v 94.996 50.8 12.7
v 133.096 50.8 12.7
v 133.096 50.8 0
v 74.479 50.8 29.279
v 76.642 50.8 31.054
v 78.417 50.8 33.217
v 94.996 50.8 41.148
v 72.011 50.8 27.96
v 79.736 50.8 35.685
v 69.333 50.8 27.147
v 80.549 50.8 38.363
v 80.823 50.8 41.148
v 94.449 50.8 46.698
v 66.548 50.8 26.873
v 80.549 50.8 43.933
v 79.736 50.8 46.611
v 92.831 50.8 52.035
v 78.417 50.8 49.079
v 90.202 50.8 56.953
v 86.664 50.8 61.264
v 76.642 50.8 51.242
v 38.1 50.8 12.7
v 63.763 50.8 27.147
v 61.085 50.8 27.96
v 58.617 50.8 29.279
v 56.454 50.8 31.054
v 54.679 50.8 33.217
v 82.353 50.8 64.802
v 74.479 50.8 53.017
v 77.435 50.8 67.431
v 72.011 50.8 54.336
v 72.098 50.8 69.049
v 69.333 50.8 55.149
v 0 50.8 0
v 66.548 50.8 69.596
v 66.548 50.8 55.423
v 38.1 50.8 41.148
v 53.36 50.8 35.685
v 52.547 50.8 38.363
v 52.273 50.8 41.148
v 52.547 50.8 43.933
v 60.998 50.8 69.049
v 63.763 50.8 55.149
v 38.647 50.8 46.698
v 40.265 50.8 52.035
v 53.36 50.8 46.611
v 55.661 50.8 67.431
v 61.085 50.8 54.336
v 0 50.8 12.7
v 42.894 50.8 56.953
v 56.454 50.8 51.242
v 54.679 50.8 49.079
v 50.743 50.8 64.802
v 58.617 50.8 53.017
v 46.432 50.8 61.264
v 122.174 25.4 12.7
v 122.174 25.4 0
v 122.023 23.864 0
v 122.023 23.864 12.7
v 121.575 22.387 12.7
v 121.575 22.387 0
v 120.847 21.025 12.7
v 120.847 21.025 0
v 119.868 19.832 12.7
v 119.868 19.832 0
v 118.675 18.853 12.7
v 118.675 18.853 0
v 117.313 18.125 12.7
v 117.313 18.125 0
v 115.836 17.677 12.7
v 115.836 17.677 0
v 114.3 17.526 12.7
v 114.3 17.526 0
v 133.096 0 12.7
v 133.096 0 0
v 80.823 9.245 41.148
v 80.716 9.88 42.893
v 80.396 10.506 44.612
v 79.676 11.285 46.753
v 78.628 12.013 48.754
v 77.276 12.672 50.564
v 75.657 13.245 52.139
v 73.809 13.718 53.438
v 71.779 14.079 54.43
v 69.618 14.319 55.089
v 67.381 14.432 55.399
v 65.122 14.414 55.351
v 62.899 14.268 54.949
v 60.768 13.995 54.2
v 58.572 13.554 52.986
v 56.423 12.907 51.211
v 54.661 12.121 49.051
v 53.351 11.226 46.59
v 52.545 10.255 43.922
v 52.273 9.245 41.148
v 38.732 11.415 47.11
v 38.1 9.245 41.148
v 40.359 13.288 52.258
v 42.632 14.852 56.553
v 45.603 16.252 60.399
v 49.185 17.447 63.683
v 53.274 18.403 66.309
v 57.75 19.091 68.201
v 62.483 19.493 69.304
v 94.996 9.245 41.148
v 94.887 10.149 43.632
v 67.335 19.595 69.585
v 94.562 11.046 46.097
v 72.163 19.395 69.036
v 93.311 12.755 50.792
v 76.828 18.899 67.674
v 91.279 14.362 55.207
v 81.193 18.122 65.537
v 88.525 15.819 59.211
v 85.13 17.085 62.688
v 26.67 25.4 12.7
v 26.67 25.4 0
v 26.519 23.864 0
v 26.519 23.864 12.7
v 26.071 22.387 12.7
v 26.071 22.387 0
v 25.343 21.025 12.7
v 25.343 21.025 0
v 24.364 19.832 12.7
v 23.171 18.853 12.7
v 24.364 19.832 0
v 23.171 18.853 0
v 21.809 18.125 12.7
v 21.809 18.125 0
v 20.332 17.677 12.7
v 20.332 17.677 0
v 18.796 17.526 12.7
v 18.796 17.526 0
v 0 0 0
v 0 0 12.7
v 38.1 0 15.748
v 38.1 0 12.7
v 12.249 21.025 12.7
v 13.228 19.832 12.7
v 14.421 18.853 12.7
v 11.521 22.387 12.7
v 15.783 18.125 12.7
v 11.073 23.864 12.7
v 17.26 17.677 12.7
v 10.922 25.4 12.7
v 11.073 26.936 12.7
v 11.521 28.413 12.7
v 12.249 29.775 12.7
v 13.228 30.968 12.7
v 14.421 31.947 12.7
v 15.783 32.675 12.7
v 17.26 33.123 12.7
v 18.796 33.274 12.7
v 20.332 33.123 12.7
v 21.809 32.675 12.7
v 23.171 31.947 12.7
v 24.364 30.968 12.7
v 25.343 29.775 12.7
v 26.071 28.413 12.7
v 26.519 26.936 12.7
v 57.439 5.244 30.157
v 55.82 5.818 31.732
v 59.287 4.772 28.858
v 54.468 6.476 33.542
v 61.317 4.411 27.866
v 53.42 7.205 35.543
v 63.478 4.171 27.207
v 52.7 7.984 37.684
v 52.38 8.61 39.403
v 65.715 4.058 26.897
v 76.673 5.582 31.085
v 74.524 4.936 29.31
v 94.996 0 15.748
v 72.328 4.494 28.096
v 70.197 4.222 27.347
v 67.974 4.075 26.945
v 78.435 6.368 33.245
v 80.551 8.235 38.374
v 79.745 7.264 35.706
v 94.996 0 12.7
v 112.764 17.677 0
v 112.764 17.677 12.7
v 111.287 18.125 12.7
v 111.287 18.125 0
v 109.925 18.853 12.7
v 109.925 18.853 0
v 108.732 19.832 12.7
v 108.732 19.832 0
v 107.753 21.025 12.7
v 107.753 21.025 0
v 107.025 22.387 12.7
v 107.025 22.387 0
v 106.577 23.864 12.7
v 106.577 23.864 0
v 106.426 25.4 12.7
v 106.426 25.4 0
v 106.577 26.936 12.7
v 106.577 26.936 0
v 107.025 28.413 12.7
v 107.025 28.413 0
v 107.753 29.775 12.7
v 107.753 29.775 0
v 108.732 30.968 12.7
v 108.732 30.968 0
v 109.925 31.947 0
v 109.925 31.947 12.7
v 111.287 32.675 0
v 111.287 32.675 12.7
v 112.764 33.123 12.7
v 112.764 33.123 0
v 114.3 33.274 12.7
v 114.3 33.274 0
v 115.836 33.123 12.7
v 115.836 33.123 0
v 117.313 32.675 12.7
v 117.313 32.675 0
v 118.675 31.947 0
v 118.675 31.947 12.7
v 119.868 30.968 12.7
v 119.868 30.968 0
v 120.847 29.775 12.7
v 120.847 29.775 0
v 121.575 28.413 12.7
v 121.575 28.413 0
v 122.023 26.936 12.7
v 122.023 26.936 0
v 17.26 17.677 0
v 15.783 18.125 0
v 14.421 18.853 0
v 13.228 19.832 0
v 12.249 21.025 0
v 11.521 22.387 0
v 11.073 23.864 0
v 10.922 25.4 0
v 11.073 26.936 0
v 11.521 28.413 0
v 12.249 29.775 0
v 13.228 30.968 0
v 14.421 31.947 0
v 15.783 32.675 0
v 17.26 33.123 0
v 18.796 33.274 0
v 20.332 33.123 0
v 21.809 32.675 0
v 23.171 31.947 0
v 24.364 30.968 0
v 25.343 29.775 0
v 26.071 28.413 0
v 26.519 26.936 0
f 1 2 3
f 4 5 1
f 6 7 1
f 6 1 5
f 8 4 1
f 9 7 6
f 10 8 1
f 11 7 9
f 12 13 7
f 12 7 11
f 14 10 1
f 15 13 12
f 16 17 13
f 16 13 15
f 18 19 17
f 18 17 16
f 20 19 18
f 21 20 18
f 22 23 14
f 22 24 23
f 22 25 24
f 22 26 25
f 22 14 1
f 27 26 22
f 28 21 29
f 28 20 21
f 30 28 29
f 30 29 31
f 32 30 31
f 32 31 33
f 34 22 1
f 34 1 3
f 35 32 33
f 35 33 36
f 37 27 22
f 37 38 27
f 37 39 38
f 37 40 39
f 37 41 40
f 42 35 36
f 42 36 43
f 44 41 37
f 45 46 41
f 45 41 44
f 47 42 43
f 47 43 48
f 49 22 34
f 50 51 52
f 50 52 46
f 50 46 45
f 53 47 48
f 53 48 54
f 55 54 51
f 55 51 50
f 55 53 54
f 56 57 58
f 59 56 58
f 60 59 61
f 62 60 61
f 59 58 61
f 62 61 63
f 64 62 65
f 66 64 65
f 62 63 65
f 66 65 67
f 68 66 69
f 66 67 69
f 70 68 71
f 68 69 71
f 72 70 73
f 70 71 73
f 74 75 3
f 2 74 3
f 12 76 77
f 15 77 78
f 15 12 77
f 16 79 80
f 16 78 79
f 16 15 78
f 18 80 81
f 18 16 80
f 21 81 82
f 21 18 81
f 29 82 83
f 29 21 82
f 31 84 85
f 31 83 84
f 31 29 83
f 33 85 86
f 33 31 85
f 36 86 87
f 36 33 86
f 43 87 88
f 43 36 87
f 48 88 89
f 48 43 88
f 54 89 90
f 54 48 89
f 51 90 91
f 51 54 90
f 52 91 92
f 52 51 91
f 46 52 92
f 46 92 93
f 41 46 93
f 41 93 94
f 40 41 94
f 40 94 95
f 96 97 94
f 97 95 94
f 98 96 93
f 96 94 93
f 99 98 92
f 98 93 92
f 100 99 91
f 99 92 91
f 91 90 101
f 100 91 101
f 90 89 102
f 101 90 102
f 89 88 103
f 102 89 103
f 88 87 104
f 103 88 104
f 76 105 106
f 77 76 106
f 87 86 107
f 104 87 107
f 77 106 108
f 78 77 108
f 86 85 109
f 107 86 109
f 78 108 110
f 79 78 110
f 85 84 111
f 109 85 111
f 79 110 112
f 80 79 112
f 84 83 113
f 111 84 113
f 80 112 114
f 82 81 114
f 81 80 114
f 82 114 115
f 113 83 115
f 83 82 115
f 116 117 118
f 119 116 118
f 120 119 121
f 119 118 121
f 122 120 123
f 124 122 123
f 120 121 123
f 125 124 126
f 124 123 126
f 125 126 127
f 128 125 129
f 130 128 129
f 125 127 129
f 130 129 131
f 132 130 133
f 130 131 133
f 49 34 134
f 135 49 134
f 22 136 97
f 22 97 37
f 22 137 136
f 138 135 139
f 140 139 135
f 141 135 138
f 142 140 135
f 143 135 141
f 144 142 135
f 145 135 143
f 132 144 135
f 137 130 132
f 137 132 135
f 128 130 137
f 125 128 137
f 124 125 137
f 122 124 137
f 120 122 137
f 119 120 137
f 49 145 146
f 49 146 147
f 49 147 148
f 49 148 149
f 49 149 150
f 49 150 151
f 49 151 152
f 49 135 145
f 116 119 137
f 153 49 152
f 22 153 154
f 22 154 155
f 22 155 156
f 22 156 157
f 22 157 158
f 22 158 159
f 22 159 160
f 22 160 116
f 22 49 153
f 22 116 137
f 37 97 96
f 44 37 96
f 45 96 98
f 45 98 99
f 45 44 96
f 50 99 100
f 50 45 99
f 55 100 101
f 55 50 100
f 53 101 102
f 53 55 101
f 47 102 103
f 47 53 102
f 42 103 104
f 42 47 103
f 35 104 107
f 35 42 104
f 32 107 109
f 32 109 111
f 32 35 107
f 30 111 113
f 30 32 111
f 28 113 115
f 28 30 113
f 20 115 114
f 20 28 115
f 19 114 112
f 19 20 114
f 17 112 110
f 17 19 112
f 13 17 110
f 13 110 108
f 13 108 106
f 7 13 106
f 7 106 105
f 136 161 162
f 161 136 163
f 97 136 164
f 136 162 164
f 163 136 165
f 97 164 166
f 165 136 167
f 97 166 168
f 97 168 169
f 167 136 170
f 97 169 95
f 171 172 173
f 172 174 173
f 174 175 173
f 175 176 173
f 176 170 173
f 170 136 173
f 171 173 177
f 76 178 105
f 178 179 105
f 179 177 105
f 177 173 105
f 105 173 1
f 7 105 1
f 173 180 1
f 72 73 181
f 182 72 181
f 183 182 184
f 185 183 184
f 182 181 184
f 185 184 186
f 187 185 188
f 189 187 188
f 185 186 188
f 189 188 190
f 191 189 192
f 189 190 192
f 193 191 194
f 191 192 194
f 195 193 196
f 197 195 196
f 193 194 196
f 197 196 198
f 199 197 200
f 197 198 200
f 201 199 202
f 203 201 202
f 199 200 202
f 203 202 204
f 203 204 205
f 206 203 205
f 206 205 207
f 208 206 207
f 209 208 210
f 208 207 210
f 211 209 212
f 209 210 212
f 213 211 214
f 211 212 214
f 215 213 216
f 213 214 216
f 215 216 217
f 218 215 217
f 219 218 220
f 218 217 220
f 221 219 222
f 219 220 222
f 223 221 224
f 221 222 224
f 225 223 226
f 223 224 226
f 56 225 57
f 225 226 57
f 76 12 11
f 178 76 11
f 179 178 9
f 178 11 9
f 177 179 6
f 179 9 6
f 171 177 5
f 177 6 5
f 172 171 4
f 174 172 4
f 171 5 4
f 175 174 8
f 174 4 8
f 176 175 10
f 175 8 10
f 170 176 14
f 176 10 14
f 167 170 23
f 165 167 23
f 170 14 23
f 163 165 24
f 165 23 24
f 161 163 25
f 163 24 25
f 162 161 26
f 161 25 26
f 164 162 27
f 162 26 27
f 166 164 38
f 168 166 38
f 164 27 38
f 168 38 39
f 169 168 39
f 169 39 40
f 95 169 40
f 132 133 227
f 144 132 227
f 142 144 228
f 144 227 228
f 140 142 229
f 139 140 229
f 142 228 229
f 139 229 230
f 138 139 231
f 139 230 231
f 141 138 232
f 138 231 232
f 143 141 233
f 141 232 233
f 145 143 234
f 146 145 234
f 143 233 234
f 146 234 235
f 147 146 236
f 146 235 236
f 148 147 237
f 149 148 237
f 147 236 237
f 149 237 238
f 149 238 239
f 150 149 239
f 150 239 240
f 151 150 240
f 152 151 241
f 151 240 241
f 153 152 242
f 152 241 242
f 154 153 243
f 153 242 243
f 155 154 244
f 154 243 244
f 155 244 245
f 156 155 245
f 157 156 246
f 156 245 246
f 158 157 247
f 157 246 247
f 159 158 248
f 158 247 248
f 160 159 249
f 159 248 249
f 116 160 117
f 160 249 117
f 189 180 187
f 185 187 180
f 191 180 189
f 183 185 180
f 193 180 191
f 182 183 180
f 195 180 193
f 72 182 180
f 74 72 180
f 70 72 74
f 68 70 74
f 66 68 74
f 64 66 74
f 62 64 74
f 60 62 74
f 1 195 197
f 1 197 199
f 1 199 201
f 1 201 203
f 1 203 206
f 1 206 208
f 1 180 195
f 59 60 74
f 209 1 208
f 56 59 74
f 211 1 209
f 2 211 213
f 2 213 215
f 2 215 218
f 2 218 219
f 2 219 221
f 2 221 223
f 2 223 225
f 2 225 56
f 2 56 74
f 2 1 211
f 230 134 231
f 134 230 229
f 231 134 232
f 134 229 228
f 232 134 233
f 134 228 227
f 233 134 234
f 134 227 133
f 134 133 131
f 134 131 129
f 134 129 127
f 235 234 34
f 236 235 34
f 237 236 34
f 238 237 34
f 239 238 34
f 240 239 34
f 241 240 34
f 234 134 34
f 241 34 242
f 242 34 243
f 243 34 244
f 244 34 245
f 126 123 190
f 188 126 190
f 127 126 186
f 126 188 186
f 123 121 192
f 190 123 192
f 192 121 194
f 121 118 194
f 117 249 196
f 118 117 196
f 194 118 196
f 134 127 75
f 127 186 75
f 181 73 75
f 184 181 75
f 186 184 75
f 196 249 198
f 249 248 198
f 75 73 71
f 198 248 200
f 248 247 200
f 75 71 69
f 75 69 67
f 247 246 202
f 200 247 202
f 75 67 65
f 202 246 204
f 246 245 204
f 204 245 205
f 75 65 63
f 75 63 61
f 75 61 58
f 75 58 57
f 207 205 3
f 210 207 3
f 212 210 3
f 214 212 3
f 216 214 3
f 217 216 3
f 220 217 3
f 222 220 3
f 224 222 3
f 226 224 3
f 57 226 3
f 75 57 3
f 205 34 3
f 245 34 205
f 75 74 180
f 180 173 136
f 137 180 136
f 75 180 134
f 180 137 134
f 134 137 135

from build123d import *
from build123d import SkipClean  # not in build123d's __all__

# Parameters (mm, degrees)
F1_DEPTH  = 12.7
F2_DEPTH  = 15.748
F3_W      = 56.896
F3_H      = 50.8
F4_DEPTH  = 25.4
F5_DEPTH  = 47.244
F7_DEPTH  = 50.8
F8_DEPTH  = 50.8
F10_DEPTH = 101.6


# Not quite as in the source:
# - a feature names something its author has since deleted; it is built from what else it names


with BuildPart() as f1:
    # F0 (on Top) → F1 (new body)
    with BuildSketch(Plane.XY):
        Polygon((133.096, 50.8), (94.996, 50.8), (94.996, 0), (114.3, 0), (133.096, 0), align=None)
        with BuildLine():
            ThreePointArc((122.174, 25.4), (119.8677587951, 19.8322412049), (114.3, 17.526))
            ThreePointArc((114.3, 17.526), (108.7322412049, 30.9677587951), (122.174, 25.4))
        make_face(mode=Mode.SUBTRACT)
        Polygon((0, 50.8), (0, 0), (18.796, 0), (38.1, 0), (38.1, 50.8), align=None)
        with BuildLine():
            ThreePointArc((26.67, 25.4), (24.3637587951, 19.8322412049), (18.796, 17.526))
            ThreePointArc((18.796, 17.526), (13.2282412049, 30.9677587951), (26.67, 25.4))
        make_face(mode=Mode.SUBTRACT)
        Polygon((94.996, 50.8), (38.1, 50.8), (38.1, 0), (66.548, 0), (94.996, 0), align=None)
    extrude(amount=F1_DEPTH)

    # F0 (on Top) → F2 (join)
    with BuildSketch(Plane.XY):
        Polygon((94.996, 50.8), (38.1, 50.8), (38.1, 0), (66.548, 0), (94.996, 0), align=None)
    extrude(amount=F2_DEPTH)

    # F3 (on face) → F4 (join)
    with BuildSketch(Plane.XY.offset(15.748)):
        with Locations((66.548, 25.4)):
            Rectangle(F3_W, F3_H)
    extrude(amount=F4_DEPTH)

    # F0 (on Top) → F5 (cut)
    with BuildSketch(Plane.XY):
        with BuildLine():
            ThreePointArc((26.67, 25.4), (13.2282412049, 30.9677587951), (18.796, 17.526))
            ThreePointArc((18.796, 17.526), (24.3637587951, 19.8322412049), (26.67, 25.4))
        make_face()
        with BuildLine():
            ThreePointArc((122.174, 25.4), (108.7322412049, 30.9677587951), (114.3, 17.526))
            ThreePointArc((114.3, 17.526), (119.8677587951, 19.8322412049), (122.174, 25.4))
        make_face()
    extrude(amount=-F5_DEPTH, mode=Mode.SUBTRACT)

    # F6 (on face) → F7 (join)
    with BuildSketch(Plane(origin=(0, 50.8, 0), x_dir=(-1, 0, 0), z_dir=(0, 1, 0))):
        with BuildLine():
            Line((-52.2732, 41.148), (-38.1, 41.148))
            ThreePointArc((-38.1, 41.148), (-66.548, 69.596), (-94.996, 41.148))
            Line((-94.996, 41.148), (-80.8228, 41.148))
            ThreePointArc((-80.8228, 41.148), (-66.548, 55.4228), (-52.2732, 41.148))
        make_face()
        with BuildLine():
            ThreePointArc((-94.996, 41.148), (-66.548, 12.7), (-38.1, 41.148))
            Line((-38.1, 41.148), (-52.2732, 41.148))
            ThreePointArc((-52.2732, 41.148), (-66.548, 26.8732), (-80.8228, 41.148))
            Line((-80.8228, 41.148), (-94.996, 41.148))
        make_face()
    extrude(amount=-F7_DEPTH)

    # F6 (on face) → F8 (cut)
    with BuildSketch(Plane(origin=(0, 50.8, 0), x_dir=(-1, 0, 0), z_dir=(0, 1, 0))):
        with BuildLine():
            ThreePointArc((-80.8228, 41.148), (-66.548, 26.8732), (-52.2732, 41.148))
            Line((-52.2732, 41.148), (-80.8228, 41.148))
        make_face()
    with SkipClean():  # cleaning this boolean's faces spoils the solid; the shape is the same uncleaned
        extrude(amount=-F8_DEPTH, mode=Mode.SUBTRACT)

    # F9 (on face) → F10 (cut)
    with BuildSketch(Plane.YZ.offset(94.996)):
        Polygon((0, 68.7535953361), (0, 41.148), (9.2448439504, 41.148), (25.583601225, 86.0383666739), (0, 86.0383666739), align=None)
        Polygon((0, 41.148), (0, 15.748), (9.2448439504, 41.148), align=None)
    with SkipClean():  # cleaning this boolean's faces spoils the solid; the shape is the same uncleaned
        extrude(amount=-F10_DEPTH, mode=Mode.SUBTRACT)


solid = f1.part
